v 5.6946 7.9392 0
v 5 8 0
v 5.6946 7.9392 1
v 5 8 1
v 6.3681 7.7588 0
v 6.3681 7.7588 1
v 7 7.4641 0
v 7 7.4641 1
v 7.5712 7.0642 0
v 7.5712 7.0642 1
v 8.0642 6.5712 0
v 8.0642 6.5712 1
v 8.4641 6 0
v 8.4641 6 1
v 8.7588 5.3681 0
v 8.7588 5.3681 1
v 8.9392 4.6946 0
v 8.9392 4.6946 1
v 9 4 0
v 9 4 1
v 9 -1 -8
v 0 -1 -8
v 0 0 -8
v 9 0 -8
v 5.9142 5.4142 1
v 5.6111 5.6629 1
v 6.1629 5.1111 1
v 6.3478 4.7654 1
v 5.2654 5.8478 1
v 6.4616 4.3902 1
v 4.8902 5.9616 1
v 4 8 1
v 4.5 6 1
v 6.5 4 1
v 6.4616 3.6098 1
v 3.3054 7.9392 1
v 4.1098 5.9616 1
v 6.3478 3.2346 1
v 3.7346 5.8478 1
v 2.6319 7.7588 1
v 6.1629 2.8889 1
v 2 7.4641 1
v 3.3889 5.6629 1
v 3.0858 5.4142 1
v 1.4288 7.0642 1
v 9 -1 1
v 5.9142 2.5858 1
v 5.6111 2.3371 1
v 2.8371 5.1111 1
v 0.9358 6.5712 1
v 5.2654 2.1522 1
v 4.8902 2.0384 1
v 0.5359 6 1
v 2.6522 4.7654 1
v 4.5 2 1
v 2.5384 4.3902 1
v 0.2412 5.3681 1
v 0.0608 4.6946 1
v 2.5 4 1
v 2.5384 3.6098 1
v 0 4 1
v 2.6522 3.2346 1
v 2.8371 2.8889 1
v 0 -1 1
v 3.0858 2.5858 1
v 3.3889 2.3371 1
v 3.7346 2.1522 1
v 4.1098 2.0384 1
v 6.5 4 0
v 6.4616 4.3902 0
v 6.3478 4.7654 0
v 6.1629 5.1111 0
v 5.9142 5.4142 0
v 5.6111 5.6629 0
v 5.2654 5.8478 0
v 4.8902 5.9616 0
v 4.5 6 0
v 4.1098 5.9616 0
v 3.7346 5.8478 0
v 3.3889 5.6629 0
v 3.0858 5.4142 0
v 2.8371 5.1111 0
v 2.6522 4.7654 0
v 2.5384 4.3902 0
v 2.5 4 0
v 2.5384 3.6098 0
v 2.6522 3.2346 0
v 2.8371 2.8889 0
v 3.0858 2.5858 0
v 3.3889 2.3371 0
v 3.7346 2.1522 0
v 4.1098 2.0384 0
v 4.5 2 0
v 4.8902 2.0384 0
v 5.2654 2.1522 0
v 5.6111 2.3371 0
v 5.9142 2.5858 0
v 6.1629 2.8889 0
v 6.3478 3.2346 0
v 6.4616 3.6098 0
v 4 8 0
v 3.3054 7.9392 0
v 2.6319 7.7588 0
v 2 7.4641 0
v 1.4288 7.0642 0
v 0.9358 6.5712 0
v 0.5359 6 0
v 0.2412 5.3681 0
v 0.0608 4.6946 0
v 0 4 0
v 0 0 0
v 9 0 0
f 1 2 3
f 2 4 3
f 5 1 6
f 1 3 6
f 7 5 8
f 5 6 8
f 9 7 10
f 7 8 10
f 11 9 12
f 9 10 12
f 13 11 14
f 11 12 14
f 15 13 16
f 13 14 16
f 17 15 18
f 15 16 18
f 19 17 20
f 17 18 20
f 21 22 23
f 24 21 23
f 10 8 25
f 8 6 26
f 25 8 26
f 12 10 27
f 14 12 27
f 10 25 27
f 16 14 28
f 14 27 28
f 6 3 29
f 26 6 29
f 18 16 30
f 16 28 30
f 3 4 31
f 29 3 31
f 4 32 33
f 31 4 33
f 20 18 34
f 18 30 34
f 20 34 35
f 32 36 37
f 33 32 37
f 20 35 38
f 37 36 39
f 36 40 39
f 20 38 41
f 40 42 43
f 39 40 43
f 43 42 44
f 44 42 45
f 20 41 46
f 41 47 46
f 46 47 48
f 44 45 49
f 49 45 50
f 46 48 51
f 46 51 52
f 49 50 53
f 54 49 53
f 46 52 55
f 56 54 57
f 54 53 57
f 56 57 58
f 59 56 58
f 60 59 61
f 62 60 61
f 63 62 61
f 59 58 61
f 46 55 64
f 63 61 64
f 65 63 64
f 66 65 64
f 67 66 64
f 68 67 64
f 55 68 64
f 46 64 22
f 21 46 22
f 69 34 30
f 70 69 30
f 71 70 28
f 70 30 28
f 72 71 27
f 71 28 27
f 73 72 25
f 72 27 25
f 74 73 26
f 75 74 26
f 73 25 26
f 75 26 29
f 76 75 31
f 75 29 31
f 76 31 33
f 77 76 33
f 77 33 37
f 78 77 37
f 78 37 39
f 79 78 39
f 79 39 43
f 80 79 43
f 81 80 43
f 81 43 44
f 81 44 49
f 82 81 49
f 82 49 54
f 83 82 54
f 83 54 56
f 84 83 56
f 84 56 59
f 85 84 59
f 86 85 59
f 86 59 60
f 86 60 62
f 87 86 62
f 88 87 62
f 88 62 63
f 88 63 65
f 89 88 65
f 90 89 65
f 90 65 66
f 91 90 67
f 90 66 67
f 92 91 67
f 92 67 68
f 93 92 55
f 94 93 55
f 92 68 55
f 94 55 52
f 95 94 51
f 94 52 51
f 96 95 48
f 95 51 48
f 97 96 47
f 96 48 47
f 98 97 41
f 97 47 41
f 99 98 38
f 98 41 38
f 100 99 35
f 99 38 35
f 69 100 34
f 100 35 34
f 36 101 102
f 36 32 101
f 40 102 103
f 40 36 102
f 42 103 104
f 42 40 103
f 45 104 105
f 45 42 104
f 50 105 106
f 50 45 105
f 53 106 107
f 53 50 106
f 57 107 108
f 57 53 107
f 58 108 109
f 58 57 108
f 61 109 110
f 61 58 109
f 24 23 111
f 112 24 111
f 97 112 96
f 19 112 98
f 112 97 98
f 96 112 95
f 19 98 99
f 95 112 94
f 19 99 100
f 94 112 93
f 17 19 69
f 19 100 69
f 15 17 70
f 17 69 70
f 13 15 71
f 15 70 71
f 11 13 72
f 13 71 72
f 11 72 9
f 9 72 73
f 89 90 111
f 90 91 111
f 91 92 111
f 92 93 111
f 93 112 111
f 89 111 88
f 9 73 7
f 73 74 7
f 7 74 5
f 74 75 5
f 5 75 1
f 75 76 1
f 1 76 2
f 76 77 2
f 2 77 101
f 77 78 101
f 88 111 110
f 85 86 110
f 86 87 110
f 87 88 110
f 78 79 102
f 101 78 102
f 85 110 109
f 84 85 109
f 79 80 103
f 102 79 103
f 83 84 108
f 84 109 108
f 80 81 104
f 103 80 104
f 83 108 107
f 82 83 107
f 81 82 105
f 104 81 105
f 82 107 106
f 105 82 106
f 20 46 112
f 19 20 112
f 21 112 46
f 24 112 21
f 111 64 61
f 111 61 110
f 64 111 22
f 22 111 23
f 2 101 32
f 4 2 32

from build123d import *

# Parameters (mm, degrees)
BOSS_EXTRUDE1_DEPTH = 9
SKETCH2_R           = 2
CUT_EXTRUDE1_DEPTH  = 10
FILLET1_R           = 4


with BuildPart() as part:
    # Sketch1 → Boss-Extrude1 (new body)
    with BuildSketch(Plane(origin=(0, 0, 0), x_dir=(0, 0, -1), z_dir=(1, 0, 0))):
        Polygon((-1, 8), (-1, -1), (8, -1), (8, 0), (0, 0), (0, 8), align=None)
    extrude(amount=BOSS_EXTRUDE1_DEPTH)

    # Sketch2 → Cut-Extrude1 (cut)
    with BuildSketch(Plane.XY.offset(1)):
        with Locations((4.5, 4)):
            Circle(SKETCH2_R)
    extrude(amount=-CUT_EXTRUDE1_DEPTH, mode=Mode.SUBTRACT)

    # Fillet1
    fillet1_edges = [part.edges().sort_by_distance(p)[0] for p in [
        (9, 8, 0.5),
        (0, 8, 0.5),
    ]]
    fillet(fillet1_edges, radius=FILLET1_R)


solid = part.part
